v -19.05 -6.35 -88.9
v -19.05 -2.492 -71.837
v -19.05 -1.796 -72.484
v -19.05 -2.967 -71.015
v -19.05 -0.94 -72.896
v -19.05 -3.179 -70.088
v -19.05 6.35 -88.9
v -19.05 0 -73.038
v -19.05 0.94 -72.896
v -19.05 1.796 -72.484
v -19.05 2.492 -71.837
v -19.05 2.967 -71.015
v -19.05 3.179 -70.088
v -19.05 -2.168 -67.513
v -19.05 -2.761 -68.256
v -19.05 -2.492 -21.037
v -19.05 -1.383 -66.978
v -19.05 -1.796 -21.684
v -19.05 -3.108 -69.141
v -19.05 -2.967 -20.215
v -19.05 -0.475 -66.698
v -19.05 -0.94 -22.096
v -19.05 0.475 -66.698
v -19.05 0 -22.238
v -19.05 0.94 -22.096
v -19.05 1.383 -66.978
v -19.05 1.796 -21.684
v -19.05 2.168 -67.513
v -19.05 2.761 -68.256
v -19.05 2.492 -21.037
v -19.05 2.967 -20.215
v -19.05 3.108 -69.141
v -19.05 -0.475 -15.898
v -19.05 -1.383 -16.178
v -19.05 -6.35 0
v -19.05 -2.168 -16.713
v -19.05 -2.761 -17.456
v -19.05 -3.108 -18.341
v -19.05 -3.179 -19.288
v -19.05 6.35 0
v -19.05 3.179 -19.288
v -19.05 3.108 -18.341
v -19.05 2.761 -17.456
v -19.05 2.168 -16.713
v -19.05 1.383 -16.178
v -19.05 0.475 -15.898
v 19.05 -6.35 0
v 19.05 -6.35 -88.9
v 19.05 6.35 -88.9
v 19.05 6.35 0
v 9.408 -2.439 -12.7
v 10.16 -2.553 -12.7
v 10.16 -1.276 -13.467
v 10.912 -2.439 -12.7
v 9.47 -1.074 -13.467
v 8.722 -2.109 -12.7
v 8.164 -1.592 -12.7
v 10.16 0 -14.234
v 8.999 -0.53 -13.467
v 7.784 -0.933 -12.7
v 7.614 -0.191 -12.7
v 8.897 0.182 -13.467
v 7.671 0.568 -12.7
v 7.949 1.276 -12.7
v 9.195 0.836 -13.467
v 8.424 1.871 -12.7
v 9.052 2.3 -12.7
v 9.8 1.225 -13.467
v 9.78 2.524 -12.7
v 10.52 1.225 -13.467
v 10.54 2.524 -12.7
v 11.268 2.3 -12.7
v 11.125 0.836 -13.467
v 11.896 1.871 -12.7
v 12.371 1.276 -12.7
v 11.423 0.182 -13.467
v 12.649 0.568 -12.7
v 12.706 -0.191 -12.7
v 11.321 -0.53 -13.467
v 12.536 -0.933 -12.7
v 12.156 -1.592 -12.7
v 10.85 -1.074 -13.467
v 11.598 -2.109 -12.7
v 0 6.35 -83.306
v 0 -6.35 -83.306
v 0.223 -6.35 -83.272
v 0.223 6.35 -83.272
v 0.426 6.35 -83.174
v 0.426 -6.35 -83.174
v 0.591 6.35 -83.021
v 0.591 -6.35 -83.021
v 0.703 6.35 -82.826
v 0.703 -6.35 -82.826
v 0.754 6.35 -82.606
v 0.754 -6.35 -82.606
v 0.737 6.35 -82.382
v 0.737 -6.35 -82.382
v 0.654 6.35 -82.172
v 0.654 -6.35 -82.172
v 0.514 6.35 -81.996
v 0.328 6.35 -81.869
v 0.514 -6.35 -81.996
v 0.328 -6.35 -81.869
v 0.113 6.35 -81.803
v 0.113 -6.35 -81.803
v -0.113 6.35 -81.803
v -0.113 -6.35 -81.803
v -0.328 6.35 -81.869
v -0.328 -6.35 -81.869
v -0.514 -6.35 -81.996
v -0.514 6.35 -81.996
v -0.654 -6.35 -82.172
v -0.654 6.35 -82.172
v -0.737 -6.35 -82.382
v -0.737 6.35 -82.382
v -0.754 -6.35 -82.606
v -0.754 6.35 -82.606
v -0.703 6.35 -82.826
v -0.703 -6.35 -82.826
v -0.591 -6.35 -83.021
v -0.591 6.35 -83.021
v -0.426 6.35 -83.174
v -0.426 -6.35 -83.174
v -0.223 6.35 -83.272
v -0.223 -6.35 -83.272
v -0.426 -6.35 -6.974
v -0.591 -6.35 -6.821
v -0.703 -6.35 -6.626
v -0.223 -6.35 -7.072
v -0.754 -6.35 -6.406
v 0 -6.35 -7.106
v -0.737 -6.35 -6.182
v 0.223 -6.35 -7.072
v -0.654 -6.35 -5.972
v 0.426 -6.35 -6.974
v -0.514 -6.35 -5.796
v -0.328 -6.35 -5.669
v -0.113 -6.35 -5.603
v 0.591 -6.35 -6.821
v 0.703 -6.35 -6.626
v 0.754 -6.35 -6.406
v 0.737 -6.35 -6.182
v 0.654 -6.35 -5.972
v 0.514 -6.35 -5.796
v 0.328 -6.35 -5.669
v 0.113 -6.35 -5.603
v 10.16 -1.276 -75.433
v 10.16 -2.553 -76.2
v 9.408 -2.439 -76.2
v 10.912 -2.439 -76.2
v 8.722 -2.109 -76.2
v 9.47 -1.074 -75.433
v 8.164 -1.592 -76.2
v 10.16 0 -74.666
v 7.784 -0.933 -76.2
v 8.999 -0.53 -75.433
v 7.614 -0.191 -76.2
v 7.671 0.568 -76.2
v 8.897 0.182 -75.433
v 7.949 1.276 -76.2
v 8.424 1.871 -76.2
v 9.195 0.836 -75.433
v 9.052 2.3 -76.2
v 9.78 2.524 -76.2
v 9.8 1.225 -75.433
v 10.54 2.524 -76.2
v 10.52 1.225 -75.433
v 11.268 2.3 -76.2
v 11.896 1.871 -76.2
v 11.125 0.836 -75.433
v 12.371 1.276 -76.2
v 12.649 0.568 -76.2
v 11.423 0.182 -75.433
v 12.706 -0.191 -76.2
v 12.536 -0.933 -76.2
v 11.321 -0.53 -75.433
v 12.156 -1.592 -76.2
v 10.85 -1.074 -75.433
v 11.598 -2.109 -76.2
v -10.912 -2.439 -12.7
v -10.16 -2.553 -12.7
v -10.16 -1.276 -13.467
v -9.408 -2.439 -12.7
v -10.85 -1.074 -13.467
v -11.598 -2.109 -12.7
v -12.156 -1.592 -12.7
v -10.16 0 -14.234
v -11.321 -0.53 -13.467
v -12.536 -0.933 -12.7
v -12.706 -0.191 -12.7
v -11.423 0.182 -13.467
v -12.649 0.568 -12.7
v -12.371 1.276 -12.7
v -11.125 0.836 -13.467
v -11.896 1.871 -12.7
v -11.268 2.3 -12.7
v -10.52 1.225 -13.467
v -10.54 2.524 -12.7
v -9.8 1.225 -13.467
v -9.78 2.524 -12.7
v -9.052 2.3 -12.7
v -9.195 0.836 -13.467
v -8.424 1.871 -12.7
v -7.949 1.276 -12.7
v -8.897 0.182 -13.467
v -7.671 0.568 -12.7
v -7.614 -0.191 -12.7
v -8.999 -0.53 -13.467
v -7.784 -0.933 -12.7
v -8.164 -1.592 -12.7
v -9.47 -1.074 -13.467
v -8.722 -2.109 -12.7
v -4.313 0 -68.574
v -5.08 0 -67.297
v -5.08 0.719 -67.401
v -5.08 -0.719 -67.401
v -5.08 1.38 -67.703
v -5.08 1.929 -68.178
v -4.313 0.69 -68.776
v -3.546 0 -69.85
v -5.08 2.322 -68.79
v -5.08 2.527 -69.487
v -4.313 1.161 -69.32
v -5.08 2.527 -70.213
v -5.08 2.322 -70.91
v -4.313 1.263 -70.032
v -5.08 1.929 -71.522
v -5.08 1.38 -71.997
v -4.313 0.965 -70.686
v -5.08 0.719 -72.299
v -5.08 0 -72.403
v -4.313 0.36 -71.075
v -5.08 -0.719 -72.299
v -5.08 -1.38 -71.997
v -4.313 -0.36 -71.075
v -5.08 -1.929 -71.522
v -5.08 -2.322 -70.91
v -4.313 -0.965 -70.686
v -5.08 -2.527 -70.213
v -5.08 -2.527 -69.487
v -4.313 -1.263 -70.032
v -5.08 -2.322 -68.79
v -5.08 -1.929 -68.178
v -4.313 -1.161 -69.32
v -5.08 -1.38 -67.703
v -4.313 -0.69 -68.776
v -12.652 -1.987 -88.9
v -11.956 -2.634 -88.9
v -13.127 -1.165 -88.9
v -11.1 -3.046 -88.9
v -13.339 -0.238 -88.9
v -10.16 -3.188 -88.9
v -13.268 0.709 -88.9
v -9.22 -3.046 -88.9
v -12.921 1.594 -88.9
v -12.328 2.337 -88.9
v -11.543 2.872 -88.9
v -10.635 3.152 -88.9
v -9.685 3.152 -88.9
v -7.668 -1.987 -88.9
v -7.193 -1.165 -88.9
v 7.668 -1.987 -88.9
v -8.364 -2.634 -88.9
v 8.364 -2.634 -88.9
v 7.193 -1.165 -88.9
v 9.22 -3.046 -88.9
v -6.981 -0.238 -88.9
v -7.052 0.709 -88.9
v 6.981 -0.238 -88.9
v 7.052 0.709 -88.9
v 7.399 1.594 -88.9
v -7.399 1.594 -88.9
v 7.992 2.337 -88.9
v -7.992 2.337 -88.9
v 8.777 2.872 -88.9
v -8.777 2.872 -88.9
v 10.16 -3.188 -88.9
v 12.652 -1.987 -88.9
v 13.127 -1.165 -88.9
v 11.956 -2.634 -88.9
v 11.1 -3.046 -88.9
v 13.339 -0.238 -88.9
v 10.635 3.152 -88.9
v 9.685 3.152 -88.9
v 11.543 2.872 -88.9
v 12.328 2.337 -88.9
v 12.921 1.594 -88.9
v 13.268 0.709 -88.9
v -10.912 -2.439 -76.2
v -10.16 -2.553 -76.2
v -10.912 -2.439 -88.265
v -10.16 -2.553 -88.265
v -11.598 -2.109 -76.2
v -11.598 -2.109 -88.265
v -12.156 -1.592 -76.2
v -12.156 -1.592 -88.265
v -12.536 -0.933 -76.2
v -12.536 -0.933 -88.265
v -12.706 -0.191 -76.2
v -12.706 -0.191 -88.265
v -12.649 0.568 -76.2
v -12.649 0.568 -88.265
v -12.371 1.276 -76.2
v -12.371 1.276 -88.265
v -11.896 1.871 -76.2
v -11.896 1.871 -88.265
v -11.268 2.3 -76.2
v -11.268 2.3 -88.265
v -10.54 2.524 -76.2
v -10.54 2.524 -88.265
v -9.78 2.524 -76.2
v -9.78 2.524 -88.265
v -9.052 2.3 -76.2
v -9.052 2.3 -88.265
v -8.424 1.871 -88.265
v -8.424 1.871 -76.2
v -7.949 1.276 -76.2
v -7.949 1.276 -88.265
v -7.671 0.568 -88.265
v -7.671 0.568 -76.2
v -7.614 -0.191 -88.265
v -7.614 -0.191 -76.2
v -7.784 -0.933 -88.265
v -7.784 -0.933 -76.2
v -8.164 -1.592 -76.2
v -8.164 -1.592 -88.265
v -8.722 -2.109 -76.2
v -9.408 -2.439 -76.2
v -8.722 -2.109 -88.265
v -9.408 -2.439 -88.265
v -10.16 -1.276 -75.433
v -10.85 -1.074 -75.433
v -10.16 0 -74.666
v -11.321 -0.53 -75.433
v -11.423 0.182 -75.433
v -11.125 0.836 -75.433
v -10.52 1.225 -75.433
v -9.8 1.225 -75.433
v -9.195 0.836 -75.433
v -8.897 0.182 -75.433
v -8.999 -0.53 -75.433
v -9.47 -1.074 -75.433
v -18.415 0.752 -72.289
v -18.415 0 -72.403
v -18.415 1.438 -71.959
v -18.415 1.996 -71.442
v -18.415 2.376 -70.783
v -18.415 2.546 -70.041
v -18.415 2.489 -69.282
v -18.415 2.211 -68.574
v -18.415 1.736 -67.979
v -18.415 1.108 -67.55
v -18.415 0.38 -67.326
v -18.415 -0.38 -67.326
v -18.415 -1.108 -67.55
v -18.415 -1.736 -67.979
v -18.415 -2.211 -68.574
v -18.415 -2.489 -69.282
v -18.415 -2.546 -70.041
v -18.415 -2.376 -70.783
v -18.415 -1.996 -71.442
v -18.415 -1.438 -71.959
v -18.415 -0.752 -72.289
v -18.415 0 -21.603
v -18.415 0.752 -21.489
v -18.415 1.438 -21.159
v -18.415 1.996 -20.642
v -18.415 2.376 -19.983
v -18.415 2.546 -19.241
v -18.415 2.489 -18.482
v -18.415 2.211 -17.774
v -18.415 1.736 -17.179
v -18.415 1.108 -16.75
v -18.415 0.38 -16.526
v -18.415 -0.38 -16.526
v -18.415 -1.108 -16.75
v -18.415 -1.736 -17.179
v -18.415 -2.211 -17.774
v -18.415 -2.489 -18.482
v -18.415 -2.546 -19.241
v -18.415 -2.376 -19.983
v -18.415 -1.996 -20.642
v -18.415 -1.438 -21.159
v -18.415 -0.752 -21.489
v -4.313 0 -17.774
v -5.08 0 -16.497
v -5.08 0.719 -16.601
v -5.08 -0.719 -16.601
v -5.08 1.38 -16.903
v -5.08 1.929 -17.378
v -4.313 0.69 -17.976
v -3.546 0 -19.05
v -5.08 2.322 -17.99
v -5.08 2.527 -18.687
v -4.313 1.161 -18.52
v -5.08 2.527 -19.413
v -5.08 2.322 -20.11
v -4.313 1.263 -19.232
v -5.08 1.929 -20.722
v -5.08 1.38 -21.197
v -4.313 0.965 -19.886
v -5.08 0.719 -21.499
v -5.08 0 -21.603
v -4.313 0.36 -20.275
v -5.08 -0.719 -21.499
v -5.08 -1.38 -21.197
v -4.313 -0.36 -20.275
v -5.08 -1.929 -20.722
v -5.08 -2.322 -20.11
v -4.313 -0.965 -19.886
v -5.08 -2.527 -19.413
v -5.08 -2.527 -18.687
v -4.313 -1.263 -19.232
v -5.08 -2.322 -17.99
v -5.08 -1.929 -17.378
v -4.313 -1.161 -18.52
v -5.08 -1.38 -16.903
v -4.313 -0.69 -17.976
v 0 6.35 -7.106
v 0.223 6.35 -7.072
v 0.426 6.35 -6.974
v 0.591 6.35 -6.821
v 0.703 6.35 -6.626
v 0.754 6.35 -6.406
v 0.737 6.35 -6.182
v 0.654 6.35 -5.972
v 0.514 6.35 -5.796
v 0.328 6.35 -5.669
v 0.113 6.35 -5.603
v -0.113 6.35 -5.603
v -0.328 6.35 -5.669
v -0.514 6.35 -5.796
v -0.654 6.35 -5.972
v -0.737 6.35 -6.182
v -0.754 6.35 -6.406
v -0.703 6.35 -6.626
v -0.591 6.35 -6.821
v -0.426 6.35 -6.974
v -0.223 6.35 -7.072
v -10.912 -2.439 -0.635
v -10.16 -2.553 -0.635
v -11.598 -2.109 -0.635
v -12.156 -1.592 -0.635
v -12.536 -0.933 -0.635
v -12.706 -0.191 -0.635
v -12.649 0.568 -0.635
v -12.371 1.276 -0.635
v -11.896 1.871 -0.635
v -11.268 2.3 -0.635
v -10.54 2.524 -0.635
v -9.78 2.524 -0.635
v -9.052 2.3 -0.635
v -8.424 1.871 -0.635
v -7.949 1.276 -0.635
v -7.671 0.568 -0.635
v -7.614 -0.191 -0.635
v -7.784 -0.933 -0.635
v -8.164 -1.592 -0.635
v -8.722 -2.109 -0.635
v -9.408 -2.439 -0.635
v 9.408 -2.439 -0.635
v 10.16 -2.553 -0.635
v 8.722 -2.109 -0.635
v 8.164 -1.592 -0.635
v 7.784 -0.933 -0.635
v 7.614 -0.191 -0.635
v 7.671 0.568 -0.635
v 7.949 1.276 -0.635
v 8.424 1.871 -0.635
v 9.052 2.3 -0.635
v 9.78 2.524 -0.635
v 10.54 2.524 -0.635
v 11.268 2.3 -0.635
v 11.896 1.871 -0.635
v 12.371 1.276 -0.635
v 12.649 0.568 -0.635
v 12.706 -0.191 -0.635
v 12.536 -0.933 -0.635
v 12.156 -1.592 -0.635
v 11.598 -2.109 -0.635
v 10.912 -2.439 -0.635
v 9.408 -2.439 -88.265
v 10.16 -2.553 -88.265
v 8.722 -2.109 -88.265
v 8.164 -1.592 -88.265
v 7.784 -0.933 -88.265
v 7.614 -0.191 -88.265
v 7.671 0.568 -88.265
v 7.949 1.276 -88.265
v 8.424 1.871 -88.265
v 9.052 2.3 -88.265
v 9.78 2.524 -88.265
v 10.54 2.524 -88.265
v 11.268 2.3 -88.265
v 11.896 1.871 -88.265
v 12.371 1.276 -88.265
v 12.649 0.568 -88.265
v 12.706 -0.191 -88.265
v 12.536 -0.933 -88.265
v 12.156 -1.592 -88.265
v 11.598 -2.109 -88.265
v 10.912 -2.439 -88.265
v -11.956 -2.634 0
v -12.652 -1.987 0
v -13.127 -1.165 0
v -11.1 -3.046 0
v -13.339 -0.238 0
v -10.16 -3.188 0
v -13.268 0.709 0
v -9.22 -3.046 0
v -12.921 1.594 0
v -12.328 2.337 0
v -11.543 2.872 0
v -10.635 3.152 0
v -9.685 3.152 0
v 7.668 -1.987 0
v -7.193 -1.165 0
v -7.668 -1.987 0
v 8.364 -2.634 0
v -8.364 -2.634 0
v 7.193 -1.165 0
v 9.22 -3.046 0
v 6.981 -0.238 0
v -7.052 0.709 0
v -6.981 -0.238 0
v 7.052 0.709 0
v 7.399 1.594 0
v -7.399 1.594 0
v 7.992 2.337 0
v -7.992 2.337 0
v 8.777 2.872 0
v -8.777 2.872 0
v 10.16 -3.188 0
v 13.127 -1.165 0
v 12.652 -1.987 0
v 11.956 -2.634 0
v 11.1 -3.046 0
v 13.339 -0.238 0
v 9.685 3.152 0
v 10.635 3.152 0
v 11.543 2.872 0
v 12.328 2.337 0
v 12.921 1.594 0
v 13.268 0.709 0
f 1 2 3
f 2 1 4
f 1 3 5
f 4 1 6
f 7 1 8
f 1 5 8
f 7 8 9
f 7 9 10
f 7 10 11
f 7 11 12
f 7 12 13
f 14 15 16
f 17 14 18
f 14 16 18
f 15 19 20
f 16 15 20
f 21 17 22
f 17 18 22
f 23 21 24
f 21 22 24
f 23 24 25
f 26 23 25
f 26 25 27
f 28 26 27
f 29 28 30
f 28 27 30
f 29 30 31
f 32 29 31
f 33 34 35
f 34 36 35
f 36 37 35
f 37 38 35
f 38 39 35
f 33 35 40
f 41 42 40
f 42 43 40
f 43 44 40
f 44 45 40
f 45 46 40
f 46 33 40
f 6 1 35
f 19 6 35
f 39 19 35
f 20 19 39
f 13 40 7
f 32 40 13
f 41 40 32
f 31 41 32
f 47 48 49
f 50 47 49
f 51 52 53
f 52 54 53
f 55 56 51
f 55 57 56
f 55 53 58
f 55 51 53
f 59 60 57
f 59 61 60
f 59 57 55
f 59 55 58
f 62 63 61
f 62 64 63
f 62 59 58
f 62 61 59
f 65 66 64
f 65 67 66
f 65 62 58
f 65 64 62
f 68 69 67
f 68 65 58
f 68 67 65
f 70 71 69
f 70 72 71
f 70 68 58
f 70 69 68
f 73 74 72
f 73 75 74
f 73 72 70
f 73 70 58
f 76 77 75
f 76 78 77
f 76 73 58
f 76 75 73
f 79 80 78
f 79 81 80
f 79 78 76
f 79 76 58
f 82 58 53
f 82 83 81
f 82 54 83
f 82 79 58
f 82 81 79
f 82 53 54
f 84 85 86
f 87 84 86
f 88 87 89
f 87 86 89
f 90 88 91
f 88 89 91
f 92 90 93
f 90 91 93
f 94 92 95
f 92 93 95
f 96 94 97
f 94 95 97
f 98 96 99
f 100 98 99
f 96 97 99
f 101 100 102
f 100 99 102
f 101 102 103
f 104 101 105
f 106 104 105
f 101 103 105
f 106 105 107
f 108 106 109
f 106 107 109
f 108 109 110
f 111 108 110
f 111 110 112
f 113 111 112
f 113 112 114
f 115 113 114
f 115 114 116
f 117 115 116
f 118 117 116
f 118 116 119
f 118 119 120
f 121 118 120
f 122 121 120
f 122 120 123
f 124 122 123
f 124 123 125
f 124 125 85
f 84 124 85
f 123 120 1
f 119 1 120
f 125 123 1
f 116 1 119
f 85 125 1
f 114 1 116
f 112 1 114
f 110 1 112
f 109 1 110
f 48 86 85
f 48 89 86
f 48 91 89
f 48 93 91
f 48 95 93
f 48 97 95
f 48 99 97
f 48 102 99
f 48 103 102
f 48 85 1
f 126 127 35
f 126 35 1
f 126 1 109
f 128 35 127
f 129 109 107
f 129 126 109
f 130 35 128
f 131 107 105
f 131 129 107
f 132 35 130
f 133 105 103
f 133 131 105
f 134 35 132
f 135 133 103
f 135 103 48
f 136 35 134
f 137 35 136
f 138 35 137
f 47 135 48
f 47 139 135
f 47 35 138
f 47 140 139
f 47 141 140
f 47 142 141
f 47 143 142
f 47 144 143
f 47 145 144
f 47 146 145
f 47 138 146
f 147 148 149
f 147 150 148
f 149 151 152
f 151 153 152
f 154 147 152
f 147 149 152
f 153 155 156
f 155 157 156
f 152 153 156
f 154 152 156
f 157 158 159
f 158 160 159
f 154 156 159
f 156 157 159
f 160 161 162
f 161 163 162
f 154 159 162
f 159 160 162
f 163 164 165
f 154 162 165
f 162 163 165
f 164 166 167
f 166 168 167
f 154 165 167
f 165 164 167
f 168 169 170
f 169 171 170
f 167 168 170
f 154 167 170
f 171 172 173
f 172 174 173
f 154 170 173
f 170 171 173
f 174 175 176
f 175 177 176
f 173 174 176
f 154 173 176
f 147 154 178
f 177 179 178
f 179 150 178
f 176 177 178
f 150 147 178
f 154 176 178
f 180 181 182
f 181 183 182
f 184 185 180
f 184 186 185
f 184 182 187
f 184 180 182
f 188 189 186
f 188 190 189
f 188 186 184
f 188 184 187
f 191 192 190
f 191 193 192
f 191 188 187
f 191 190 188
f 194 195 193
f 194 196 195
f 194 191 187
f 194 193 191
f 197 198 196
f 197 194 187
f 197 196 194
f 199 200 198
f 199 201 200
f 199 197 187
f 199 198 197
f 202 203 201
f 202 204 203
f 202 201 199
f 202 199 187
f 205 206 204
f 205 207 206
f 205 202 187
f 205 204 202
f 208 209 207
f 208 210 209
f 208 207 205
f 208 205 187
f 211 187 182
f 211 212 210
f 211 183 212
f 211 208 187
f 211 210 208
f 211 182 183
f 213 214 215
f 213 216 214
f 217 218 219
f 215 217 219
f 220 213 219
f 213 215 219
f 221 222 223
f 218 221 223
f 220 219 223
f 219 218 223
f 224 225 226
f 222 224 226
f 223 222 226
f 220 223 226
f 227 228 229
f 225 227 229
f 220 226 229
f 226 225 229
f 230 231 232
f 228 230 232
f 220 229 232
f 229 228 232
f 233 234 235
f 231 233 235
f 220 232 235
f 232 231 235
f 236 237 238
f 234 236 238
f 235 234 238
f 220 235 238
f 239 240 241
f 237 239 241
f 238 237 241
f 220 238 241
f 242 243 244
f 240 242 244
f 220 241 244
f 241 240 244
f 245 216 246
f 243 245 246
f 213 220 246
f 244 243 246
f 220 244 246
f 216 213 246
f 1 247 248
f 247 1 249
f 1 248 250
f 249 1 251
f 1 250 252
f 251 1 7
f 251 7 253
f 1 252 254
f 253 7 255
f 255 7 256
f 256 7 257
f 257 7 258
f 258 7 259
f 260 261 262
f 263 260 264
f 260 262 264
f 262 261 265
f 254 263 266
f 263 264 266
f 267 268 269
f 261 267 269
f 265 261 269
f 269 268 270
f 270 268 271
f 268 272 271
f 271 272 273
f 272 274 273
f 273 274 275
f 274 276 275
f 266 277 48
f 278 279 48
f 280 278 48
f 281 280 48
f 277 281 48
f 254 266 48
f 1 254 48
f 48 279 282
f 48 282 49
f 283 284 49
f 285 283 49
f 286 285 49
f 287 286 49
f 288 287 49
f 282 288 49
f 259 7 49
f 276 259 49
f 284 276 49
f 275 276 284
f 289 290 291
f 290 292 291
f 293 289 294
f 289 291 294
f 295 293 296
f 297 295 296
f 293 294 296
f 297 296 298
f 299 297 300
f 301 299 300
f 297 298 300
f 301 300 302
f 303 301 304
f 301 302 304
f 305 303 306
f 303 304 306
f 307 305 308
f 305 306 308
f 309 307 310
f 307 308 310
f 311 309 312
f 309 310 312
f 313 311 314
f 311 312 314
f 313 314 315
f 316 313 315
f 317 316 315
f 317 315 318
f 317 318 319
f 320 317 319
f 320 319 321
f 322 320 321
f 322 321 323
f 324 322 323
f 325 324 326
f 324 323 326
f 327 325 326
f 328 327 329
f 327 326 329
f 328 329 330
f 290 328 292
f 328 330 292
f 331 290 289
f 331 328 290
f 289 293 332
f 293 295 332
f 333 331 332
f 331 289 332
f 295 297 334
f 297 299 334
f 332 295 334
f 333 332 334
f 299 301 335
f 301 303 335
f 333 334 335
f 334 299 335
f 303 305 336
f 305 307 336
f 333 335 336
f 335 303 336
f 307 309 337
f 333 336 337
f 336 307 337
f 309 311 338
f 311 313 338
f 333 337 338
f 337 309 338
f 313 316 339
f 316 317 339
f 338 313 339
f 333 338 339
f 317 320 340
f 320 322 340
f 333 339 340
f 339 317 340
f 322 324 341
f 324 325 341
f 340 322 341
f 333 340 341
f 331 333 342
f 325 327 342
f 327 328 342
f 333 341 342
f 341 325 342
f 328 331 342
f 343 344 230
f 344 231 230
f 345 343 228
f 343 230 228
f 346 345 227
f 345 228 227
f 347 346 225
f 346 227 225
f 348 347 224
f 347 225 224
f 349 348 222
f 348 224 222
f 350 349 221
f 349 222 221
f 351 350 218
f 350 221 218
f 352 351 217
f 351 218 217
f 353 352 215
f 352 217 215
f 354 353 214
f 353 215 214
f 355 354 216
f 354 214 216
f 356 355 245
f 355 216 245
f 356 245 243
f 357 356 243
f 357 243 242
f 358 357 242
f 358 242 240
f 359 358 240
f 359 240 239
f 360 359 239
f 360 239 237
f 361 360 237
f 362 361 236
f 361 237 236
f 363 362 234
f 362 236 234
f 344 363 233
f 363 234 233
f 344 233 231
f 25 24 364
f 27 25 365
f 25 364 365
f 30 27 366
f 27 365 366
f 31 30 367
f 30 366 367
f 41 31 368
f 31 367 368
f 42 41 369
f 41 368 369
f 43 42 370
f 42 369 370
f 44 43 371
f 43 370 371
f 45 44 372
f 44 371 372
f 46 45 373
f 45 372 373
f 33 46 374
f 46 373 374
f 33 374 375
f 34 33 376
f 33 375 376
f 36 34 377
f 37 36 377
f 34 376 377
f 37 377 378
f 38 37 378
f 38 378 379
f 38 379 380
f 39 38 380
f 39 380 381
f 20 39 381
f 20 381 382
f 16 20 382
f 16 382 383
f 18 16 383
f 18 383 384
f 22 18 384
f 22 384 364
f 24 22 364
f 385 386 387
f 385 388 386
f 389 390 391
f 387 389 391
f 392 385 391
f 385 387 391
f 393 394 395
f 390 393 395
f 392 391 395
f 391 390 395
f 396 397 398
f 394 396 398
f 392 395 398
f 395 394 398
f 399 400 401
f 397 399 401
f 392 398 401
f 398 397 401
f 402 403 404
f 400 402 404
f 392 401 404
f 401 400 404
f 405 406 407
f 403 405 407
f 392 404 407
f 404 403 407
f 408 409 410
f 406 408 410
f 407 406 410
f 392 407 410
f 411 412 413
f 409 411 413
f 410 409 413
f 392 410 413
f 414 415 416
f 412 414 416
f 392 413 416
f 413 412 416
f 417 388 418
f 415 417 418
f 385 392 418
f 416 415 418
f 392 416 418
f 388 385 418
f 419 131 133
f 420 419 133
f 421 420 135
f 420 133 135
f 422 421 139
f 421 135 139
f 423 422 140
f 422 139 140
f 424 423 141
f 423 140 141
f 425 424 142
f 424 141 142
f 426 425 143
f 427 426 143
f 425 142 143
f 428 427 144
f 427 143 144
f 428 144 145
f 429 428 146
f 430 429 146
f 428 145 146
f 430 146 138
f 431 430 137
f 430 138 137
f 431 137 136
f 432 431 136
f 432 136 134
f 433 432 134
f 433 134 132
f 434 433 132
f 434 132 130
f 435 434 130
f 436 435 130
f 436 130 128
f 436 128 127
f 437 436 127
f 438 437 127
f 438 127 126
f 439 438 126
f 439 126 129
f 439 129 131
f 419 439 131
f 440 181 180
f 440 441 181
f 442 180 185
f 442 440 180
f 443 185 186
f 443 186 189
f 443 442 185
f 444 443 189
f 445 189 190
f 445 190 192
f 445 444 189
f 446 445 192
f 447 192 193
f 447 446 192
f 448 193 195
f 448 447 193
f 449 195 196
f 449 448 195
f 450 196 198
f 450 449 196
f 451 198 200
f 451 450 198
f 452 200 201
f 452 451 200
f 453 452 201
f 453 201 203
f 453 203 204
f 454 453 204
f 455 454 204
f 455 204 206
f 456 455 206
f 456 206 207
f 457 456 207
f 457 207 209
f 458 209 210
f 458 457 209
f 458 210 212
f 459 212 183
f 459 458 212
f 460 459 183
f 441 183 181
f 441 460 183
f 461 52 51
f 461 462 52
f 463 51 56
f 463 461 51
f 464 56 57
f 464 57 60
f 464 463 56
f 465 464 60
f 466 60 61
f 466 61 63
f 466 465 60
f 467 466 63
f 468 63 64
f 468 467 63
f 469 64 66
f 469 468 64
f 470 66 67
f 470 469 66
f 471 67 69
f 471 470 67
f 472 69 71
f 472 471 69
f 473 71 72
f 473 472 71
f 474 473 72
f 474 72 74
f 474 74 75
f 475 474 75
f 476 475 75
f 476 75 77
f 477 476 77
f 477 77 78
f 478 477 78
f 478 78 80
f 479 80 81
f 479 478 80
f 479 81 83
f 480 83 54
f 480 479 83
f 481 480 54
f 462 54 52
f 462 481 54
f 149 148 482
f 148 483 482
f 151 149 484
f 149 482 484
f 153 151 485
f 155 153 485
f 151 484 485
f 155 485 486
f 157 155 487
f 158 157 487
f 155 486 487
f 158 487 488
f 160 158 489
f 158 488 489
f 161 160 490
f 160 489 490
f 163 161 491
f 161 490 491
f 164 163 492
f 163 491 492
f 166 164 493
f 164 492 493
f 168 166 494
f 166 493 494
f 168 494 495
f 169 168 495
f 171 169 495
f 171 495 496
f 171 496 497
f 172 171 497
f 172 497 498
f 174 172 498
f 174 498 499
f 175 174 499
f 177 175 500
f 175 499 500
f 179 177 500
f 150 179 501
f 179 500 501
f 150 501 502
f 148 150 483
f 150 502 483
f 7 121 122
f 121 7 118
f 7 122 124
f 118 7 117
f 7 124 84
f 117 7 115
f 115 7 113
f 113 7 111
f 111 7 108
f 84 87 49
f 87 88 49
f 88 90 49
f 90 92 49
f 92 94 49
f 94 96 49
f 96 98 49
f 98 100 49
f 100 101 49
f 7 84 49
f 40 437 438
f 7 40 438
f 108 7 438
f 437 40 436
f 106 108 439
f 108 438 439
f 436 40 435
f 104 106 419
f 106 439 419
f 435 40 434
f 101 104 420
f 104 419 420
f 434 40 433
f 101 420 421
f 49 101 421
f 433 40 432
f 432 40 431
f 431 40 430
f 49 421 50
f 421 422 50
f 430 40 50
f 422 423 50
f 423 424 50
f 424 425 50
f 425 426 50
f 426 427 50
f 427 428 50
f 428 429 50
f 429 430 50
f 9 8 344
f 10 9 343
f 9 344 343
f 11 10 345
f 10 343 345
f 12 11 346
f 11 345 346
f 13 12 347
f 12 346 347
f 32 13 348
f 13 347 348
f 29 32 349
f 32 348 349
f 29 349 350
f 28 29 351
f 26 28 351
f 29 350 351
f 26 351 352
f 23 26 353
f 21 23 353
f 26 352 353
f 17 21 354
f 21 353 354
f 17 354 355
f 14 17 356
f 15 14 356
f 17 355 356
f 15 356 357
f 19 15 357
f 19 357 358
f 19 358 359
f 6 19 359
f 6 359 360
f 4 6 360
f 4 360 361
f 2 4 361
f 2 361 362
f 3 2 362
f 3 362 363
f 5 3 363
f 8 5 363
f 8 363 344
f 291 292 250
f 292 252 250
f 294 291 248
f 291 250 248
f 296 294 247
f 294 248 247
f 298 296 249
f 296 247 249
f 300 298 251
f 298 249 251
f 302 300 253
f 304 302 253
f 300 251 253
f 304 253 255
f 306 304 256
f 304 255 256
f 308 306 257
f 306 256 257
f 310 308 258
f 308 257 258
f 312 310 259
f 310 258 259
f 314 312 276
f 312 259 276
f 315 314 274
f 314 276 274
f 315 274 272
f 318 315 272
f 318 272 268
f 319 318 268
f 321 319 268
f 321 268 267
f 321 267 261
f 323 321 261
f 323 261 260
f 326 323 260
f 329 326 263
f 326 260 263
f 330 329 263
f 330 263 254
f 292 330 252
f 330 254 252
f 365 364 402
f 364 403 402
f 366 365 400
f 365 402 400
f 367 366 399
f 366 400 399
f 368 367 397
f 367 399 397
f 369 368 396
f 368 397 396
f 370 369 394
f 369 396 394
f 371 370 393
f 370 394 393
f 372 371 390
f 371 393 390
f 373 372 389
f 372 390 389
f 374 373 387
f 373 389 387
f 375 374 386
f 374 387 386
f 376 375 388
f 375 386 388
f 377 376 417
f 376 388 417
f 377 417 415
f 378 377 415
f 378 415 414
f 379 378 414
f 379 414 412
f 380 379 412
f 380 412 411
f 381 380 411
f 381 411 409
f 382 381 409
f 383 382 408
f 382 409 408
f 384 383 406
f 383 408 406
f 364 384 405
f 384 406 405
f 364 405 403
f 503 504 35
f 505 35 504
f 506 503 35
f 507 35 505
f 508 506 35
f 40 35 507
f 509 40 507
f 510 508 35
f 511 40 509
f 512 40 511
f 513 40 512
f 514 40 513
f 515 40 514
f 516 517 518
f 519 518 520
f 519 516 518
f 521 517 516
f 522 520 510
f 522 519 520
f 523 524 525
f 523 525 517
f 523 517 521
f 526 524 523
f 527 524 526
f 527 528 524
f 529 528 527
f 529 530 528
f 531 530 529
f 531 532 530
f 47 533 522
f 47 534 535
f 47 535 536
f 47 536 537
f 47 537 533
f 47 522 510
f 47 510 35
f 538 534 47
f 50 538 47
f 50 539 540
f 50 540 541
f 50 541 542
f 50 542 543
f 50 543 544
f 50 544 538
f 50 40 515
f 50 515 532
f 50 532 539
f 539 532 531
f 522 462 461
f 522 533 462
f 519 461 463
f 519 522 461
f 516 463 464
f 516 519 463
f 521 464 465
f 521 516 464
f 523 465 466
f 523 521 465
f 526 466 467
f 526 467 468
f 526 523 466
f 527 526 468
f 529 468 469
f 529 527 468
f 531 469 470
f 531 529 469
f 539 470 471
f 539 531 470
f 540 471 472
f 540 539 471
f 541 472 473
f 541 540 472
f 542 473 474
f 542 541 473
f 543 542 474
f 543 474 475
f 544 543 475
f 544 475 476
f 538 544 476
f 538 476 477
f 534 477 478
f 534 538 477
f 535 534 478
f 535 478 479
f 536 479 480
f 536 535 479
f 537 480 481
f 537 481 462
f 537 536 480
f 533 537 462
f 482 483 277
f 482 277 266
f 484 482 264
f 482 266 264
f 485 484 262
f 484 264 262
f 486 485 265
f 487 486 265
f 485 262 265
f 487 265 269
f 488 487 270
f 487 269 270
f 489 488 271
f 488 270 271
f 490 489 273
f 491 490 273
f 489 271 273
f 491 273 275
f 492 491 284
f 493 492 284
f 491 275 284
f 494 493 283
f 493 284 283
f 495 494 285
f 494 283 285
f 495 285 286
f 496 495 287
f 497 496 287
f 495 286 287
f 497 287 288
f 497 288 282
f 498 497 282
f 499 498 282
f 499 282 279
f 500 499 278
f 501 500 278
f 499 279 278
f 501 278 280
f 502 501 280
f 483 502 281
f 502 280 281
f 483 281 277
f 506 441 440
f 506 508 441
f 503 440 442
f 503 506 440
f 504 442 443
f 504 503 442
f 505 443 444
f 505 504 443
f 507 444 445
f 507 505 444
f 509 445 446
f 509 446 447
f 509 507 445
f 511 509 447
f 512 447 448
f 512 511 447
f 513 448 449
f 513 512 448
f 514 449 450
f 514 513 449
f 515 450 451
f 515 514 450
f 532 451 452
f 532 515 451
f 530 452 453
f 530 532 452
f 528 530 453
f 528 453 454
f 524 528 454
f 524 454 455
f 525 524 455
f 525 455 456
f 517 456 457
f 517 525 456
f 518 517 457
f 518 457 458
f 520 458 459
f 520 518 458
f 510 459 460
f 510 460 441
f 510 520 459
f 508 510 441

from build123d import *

# Parameters (mm, degrees)
SKETCH1_W                         = 38.1
SKETCH1_H                         = 12.7
BOSS_EXTRUDE1_DEPTH               = 88.9
F_1_4_20_TAPPED_HOLE1_AT_2_COUNT  = 2
F_1_4_20_TAPPED_HOLE1_AT_2_PITCH  = 20.32
F_1_64_TAPPED_HOLE1_D             = 1.5113
F_1_4_20_TAPPED_HOLE3_D           = 5.1054
F_1_4_20_TAPPED_HOLE3_DEPTH       = 13.97
F_1_4_20_TAPPED_HOLE3_CSINK_D     = 6.3754
F_1_4_20_TAPPED_HOLE3_CSINK_ANGLE = 90
F_1_4_20_TAPPED_HOLE3_TIP         = 1.533816902


with BuildPart() as part:
    # Sketch1 → Boss-Extrude1 (new body)
    with BuildSketch(Plane.XY):
        Rectangle(SKETCH1_W, SKETCH1_H)
    extrude(amount=-BOSS_EXTRUDE1_DEPTH)

    # Sketch4 → 1/4-20 Tapped Hole1 (revolve, cut)
    with BuildSketch(Plane(origin=(-10.16, 0, 0), x_dir=(0, -1, 0), z_dir=(1, 0, 0))):
        Polygon((0, 0), (0, 14.233816902), (2.5527, 12.7), (2.5527, 0.635), (3.1877, 0), align=None)
    f_1_4_20_tapped_hole1 = revolve(axis=Axis((-10.16, 0, 6.35), (0, 0, -1)), mode=Mode.SUBTRACT)

    # 1/4-20 Tapped Hole1 at 2: 1/4-20 Tapped Hole1 ×2
    with Locations(*[(i * F_1_4_20_TAPPED_HOLE1_AT_2_PITCH, 0, 0) for i in range(1, F_1_4_20_TAPPED_HOLE1_AT_2_COUNT)]):
        add(f_1_4_20_tapped_hole1, mode=Mode.SUBTRACT)

    # Mirror1: 1/4-20 Tapped Hole1 across plane
    add(f_1_4_20_tapped_hole1.mirror(Plane.XY.offset(-44.45)), mode=Mode.SUBTRACT)

    # Mirror1 copy 1 sketch → Mirror1 copy 1 (revolve, cut)
    with BuildSketch(Plane(origin=(10.16, 0, -88.9), x_dir=(0, -1, 0), z_dir=(1, 0, 0))):
        Polygon((0, 0), (0, -14.233816902), (2.5527, -12.7), (2.5527, -0.635), (3.1877, 0), align=None)
    revolve(axis=Axis((10.16, 0, -95.25), (0, 0, -1)), mode=Mode.SUBTRACT)

    # #1-64 Tapped Hole1 (through all)
    with Locations(Plane(origin=(0, 6.35, -82.55), x_dir=(0, 0, 1), z_dir=(0, 1, 0))):
        with Locations((0, 0), (76.2, 0)):
            Hole(F_1_64_TAPPED_HOLE1_D / 2)

    # 1/4-20 Tapped Hole3
    with Locations(Plane.ZY.offset(19.05)):
        with Locations((-69.85, 0), (-19.05, 0)):
            CounterSinkHole(F_1_4_20_TAPPED_HOLE3_D / 2, F_1_4_20_TAPPED_HOLE3_CSINK_D / 2, depth=F_1_4_20_TAPPED_HOLE3_DEPTH, counter_sink_angle=F_1_4_20_TAPPED_HOLE3_CSINK_ANGLE)
            with Locations((0, 0, -(F_1_4_20_TAPPED_HOLE3_DEPTH + F_1_4_20_TAPPED_HOLE3_TIP / 2))):  # 118° drill point
                Cone(0, F_1_4_20_TAPPED_HOLE3_D / 2, F_1_4_20_TAPPED_HOLE3_TIP, mode=Mode.SUBTRACT)


solid = part.part
